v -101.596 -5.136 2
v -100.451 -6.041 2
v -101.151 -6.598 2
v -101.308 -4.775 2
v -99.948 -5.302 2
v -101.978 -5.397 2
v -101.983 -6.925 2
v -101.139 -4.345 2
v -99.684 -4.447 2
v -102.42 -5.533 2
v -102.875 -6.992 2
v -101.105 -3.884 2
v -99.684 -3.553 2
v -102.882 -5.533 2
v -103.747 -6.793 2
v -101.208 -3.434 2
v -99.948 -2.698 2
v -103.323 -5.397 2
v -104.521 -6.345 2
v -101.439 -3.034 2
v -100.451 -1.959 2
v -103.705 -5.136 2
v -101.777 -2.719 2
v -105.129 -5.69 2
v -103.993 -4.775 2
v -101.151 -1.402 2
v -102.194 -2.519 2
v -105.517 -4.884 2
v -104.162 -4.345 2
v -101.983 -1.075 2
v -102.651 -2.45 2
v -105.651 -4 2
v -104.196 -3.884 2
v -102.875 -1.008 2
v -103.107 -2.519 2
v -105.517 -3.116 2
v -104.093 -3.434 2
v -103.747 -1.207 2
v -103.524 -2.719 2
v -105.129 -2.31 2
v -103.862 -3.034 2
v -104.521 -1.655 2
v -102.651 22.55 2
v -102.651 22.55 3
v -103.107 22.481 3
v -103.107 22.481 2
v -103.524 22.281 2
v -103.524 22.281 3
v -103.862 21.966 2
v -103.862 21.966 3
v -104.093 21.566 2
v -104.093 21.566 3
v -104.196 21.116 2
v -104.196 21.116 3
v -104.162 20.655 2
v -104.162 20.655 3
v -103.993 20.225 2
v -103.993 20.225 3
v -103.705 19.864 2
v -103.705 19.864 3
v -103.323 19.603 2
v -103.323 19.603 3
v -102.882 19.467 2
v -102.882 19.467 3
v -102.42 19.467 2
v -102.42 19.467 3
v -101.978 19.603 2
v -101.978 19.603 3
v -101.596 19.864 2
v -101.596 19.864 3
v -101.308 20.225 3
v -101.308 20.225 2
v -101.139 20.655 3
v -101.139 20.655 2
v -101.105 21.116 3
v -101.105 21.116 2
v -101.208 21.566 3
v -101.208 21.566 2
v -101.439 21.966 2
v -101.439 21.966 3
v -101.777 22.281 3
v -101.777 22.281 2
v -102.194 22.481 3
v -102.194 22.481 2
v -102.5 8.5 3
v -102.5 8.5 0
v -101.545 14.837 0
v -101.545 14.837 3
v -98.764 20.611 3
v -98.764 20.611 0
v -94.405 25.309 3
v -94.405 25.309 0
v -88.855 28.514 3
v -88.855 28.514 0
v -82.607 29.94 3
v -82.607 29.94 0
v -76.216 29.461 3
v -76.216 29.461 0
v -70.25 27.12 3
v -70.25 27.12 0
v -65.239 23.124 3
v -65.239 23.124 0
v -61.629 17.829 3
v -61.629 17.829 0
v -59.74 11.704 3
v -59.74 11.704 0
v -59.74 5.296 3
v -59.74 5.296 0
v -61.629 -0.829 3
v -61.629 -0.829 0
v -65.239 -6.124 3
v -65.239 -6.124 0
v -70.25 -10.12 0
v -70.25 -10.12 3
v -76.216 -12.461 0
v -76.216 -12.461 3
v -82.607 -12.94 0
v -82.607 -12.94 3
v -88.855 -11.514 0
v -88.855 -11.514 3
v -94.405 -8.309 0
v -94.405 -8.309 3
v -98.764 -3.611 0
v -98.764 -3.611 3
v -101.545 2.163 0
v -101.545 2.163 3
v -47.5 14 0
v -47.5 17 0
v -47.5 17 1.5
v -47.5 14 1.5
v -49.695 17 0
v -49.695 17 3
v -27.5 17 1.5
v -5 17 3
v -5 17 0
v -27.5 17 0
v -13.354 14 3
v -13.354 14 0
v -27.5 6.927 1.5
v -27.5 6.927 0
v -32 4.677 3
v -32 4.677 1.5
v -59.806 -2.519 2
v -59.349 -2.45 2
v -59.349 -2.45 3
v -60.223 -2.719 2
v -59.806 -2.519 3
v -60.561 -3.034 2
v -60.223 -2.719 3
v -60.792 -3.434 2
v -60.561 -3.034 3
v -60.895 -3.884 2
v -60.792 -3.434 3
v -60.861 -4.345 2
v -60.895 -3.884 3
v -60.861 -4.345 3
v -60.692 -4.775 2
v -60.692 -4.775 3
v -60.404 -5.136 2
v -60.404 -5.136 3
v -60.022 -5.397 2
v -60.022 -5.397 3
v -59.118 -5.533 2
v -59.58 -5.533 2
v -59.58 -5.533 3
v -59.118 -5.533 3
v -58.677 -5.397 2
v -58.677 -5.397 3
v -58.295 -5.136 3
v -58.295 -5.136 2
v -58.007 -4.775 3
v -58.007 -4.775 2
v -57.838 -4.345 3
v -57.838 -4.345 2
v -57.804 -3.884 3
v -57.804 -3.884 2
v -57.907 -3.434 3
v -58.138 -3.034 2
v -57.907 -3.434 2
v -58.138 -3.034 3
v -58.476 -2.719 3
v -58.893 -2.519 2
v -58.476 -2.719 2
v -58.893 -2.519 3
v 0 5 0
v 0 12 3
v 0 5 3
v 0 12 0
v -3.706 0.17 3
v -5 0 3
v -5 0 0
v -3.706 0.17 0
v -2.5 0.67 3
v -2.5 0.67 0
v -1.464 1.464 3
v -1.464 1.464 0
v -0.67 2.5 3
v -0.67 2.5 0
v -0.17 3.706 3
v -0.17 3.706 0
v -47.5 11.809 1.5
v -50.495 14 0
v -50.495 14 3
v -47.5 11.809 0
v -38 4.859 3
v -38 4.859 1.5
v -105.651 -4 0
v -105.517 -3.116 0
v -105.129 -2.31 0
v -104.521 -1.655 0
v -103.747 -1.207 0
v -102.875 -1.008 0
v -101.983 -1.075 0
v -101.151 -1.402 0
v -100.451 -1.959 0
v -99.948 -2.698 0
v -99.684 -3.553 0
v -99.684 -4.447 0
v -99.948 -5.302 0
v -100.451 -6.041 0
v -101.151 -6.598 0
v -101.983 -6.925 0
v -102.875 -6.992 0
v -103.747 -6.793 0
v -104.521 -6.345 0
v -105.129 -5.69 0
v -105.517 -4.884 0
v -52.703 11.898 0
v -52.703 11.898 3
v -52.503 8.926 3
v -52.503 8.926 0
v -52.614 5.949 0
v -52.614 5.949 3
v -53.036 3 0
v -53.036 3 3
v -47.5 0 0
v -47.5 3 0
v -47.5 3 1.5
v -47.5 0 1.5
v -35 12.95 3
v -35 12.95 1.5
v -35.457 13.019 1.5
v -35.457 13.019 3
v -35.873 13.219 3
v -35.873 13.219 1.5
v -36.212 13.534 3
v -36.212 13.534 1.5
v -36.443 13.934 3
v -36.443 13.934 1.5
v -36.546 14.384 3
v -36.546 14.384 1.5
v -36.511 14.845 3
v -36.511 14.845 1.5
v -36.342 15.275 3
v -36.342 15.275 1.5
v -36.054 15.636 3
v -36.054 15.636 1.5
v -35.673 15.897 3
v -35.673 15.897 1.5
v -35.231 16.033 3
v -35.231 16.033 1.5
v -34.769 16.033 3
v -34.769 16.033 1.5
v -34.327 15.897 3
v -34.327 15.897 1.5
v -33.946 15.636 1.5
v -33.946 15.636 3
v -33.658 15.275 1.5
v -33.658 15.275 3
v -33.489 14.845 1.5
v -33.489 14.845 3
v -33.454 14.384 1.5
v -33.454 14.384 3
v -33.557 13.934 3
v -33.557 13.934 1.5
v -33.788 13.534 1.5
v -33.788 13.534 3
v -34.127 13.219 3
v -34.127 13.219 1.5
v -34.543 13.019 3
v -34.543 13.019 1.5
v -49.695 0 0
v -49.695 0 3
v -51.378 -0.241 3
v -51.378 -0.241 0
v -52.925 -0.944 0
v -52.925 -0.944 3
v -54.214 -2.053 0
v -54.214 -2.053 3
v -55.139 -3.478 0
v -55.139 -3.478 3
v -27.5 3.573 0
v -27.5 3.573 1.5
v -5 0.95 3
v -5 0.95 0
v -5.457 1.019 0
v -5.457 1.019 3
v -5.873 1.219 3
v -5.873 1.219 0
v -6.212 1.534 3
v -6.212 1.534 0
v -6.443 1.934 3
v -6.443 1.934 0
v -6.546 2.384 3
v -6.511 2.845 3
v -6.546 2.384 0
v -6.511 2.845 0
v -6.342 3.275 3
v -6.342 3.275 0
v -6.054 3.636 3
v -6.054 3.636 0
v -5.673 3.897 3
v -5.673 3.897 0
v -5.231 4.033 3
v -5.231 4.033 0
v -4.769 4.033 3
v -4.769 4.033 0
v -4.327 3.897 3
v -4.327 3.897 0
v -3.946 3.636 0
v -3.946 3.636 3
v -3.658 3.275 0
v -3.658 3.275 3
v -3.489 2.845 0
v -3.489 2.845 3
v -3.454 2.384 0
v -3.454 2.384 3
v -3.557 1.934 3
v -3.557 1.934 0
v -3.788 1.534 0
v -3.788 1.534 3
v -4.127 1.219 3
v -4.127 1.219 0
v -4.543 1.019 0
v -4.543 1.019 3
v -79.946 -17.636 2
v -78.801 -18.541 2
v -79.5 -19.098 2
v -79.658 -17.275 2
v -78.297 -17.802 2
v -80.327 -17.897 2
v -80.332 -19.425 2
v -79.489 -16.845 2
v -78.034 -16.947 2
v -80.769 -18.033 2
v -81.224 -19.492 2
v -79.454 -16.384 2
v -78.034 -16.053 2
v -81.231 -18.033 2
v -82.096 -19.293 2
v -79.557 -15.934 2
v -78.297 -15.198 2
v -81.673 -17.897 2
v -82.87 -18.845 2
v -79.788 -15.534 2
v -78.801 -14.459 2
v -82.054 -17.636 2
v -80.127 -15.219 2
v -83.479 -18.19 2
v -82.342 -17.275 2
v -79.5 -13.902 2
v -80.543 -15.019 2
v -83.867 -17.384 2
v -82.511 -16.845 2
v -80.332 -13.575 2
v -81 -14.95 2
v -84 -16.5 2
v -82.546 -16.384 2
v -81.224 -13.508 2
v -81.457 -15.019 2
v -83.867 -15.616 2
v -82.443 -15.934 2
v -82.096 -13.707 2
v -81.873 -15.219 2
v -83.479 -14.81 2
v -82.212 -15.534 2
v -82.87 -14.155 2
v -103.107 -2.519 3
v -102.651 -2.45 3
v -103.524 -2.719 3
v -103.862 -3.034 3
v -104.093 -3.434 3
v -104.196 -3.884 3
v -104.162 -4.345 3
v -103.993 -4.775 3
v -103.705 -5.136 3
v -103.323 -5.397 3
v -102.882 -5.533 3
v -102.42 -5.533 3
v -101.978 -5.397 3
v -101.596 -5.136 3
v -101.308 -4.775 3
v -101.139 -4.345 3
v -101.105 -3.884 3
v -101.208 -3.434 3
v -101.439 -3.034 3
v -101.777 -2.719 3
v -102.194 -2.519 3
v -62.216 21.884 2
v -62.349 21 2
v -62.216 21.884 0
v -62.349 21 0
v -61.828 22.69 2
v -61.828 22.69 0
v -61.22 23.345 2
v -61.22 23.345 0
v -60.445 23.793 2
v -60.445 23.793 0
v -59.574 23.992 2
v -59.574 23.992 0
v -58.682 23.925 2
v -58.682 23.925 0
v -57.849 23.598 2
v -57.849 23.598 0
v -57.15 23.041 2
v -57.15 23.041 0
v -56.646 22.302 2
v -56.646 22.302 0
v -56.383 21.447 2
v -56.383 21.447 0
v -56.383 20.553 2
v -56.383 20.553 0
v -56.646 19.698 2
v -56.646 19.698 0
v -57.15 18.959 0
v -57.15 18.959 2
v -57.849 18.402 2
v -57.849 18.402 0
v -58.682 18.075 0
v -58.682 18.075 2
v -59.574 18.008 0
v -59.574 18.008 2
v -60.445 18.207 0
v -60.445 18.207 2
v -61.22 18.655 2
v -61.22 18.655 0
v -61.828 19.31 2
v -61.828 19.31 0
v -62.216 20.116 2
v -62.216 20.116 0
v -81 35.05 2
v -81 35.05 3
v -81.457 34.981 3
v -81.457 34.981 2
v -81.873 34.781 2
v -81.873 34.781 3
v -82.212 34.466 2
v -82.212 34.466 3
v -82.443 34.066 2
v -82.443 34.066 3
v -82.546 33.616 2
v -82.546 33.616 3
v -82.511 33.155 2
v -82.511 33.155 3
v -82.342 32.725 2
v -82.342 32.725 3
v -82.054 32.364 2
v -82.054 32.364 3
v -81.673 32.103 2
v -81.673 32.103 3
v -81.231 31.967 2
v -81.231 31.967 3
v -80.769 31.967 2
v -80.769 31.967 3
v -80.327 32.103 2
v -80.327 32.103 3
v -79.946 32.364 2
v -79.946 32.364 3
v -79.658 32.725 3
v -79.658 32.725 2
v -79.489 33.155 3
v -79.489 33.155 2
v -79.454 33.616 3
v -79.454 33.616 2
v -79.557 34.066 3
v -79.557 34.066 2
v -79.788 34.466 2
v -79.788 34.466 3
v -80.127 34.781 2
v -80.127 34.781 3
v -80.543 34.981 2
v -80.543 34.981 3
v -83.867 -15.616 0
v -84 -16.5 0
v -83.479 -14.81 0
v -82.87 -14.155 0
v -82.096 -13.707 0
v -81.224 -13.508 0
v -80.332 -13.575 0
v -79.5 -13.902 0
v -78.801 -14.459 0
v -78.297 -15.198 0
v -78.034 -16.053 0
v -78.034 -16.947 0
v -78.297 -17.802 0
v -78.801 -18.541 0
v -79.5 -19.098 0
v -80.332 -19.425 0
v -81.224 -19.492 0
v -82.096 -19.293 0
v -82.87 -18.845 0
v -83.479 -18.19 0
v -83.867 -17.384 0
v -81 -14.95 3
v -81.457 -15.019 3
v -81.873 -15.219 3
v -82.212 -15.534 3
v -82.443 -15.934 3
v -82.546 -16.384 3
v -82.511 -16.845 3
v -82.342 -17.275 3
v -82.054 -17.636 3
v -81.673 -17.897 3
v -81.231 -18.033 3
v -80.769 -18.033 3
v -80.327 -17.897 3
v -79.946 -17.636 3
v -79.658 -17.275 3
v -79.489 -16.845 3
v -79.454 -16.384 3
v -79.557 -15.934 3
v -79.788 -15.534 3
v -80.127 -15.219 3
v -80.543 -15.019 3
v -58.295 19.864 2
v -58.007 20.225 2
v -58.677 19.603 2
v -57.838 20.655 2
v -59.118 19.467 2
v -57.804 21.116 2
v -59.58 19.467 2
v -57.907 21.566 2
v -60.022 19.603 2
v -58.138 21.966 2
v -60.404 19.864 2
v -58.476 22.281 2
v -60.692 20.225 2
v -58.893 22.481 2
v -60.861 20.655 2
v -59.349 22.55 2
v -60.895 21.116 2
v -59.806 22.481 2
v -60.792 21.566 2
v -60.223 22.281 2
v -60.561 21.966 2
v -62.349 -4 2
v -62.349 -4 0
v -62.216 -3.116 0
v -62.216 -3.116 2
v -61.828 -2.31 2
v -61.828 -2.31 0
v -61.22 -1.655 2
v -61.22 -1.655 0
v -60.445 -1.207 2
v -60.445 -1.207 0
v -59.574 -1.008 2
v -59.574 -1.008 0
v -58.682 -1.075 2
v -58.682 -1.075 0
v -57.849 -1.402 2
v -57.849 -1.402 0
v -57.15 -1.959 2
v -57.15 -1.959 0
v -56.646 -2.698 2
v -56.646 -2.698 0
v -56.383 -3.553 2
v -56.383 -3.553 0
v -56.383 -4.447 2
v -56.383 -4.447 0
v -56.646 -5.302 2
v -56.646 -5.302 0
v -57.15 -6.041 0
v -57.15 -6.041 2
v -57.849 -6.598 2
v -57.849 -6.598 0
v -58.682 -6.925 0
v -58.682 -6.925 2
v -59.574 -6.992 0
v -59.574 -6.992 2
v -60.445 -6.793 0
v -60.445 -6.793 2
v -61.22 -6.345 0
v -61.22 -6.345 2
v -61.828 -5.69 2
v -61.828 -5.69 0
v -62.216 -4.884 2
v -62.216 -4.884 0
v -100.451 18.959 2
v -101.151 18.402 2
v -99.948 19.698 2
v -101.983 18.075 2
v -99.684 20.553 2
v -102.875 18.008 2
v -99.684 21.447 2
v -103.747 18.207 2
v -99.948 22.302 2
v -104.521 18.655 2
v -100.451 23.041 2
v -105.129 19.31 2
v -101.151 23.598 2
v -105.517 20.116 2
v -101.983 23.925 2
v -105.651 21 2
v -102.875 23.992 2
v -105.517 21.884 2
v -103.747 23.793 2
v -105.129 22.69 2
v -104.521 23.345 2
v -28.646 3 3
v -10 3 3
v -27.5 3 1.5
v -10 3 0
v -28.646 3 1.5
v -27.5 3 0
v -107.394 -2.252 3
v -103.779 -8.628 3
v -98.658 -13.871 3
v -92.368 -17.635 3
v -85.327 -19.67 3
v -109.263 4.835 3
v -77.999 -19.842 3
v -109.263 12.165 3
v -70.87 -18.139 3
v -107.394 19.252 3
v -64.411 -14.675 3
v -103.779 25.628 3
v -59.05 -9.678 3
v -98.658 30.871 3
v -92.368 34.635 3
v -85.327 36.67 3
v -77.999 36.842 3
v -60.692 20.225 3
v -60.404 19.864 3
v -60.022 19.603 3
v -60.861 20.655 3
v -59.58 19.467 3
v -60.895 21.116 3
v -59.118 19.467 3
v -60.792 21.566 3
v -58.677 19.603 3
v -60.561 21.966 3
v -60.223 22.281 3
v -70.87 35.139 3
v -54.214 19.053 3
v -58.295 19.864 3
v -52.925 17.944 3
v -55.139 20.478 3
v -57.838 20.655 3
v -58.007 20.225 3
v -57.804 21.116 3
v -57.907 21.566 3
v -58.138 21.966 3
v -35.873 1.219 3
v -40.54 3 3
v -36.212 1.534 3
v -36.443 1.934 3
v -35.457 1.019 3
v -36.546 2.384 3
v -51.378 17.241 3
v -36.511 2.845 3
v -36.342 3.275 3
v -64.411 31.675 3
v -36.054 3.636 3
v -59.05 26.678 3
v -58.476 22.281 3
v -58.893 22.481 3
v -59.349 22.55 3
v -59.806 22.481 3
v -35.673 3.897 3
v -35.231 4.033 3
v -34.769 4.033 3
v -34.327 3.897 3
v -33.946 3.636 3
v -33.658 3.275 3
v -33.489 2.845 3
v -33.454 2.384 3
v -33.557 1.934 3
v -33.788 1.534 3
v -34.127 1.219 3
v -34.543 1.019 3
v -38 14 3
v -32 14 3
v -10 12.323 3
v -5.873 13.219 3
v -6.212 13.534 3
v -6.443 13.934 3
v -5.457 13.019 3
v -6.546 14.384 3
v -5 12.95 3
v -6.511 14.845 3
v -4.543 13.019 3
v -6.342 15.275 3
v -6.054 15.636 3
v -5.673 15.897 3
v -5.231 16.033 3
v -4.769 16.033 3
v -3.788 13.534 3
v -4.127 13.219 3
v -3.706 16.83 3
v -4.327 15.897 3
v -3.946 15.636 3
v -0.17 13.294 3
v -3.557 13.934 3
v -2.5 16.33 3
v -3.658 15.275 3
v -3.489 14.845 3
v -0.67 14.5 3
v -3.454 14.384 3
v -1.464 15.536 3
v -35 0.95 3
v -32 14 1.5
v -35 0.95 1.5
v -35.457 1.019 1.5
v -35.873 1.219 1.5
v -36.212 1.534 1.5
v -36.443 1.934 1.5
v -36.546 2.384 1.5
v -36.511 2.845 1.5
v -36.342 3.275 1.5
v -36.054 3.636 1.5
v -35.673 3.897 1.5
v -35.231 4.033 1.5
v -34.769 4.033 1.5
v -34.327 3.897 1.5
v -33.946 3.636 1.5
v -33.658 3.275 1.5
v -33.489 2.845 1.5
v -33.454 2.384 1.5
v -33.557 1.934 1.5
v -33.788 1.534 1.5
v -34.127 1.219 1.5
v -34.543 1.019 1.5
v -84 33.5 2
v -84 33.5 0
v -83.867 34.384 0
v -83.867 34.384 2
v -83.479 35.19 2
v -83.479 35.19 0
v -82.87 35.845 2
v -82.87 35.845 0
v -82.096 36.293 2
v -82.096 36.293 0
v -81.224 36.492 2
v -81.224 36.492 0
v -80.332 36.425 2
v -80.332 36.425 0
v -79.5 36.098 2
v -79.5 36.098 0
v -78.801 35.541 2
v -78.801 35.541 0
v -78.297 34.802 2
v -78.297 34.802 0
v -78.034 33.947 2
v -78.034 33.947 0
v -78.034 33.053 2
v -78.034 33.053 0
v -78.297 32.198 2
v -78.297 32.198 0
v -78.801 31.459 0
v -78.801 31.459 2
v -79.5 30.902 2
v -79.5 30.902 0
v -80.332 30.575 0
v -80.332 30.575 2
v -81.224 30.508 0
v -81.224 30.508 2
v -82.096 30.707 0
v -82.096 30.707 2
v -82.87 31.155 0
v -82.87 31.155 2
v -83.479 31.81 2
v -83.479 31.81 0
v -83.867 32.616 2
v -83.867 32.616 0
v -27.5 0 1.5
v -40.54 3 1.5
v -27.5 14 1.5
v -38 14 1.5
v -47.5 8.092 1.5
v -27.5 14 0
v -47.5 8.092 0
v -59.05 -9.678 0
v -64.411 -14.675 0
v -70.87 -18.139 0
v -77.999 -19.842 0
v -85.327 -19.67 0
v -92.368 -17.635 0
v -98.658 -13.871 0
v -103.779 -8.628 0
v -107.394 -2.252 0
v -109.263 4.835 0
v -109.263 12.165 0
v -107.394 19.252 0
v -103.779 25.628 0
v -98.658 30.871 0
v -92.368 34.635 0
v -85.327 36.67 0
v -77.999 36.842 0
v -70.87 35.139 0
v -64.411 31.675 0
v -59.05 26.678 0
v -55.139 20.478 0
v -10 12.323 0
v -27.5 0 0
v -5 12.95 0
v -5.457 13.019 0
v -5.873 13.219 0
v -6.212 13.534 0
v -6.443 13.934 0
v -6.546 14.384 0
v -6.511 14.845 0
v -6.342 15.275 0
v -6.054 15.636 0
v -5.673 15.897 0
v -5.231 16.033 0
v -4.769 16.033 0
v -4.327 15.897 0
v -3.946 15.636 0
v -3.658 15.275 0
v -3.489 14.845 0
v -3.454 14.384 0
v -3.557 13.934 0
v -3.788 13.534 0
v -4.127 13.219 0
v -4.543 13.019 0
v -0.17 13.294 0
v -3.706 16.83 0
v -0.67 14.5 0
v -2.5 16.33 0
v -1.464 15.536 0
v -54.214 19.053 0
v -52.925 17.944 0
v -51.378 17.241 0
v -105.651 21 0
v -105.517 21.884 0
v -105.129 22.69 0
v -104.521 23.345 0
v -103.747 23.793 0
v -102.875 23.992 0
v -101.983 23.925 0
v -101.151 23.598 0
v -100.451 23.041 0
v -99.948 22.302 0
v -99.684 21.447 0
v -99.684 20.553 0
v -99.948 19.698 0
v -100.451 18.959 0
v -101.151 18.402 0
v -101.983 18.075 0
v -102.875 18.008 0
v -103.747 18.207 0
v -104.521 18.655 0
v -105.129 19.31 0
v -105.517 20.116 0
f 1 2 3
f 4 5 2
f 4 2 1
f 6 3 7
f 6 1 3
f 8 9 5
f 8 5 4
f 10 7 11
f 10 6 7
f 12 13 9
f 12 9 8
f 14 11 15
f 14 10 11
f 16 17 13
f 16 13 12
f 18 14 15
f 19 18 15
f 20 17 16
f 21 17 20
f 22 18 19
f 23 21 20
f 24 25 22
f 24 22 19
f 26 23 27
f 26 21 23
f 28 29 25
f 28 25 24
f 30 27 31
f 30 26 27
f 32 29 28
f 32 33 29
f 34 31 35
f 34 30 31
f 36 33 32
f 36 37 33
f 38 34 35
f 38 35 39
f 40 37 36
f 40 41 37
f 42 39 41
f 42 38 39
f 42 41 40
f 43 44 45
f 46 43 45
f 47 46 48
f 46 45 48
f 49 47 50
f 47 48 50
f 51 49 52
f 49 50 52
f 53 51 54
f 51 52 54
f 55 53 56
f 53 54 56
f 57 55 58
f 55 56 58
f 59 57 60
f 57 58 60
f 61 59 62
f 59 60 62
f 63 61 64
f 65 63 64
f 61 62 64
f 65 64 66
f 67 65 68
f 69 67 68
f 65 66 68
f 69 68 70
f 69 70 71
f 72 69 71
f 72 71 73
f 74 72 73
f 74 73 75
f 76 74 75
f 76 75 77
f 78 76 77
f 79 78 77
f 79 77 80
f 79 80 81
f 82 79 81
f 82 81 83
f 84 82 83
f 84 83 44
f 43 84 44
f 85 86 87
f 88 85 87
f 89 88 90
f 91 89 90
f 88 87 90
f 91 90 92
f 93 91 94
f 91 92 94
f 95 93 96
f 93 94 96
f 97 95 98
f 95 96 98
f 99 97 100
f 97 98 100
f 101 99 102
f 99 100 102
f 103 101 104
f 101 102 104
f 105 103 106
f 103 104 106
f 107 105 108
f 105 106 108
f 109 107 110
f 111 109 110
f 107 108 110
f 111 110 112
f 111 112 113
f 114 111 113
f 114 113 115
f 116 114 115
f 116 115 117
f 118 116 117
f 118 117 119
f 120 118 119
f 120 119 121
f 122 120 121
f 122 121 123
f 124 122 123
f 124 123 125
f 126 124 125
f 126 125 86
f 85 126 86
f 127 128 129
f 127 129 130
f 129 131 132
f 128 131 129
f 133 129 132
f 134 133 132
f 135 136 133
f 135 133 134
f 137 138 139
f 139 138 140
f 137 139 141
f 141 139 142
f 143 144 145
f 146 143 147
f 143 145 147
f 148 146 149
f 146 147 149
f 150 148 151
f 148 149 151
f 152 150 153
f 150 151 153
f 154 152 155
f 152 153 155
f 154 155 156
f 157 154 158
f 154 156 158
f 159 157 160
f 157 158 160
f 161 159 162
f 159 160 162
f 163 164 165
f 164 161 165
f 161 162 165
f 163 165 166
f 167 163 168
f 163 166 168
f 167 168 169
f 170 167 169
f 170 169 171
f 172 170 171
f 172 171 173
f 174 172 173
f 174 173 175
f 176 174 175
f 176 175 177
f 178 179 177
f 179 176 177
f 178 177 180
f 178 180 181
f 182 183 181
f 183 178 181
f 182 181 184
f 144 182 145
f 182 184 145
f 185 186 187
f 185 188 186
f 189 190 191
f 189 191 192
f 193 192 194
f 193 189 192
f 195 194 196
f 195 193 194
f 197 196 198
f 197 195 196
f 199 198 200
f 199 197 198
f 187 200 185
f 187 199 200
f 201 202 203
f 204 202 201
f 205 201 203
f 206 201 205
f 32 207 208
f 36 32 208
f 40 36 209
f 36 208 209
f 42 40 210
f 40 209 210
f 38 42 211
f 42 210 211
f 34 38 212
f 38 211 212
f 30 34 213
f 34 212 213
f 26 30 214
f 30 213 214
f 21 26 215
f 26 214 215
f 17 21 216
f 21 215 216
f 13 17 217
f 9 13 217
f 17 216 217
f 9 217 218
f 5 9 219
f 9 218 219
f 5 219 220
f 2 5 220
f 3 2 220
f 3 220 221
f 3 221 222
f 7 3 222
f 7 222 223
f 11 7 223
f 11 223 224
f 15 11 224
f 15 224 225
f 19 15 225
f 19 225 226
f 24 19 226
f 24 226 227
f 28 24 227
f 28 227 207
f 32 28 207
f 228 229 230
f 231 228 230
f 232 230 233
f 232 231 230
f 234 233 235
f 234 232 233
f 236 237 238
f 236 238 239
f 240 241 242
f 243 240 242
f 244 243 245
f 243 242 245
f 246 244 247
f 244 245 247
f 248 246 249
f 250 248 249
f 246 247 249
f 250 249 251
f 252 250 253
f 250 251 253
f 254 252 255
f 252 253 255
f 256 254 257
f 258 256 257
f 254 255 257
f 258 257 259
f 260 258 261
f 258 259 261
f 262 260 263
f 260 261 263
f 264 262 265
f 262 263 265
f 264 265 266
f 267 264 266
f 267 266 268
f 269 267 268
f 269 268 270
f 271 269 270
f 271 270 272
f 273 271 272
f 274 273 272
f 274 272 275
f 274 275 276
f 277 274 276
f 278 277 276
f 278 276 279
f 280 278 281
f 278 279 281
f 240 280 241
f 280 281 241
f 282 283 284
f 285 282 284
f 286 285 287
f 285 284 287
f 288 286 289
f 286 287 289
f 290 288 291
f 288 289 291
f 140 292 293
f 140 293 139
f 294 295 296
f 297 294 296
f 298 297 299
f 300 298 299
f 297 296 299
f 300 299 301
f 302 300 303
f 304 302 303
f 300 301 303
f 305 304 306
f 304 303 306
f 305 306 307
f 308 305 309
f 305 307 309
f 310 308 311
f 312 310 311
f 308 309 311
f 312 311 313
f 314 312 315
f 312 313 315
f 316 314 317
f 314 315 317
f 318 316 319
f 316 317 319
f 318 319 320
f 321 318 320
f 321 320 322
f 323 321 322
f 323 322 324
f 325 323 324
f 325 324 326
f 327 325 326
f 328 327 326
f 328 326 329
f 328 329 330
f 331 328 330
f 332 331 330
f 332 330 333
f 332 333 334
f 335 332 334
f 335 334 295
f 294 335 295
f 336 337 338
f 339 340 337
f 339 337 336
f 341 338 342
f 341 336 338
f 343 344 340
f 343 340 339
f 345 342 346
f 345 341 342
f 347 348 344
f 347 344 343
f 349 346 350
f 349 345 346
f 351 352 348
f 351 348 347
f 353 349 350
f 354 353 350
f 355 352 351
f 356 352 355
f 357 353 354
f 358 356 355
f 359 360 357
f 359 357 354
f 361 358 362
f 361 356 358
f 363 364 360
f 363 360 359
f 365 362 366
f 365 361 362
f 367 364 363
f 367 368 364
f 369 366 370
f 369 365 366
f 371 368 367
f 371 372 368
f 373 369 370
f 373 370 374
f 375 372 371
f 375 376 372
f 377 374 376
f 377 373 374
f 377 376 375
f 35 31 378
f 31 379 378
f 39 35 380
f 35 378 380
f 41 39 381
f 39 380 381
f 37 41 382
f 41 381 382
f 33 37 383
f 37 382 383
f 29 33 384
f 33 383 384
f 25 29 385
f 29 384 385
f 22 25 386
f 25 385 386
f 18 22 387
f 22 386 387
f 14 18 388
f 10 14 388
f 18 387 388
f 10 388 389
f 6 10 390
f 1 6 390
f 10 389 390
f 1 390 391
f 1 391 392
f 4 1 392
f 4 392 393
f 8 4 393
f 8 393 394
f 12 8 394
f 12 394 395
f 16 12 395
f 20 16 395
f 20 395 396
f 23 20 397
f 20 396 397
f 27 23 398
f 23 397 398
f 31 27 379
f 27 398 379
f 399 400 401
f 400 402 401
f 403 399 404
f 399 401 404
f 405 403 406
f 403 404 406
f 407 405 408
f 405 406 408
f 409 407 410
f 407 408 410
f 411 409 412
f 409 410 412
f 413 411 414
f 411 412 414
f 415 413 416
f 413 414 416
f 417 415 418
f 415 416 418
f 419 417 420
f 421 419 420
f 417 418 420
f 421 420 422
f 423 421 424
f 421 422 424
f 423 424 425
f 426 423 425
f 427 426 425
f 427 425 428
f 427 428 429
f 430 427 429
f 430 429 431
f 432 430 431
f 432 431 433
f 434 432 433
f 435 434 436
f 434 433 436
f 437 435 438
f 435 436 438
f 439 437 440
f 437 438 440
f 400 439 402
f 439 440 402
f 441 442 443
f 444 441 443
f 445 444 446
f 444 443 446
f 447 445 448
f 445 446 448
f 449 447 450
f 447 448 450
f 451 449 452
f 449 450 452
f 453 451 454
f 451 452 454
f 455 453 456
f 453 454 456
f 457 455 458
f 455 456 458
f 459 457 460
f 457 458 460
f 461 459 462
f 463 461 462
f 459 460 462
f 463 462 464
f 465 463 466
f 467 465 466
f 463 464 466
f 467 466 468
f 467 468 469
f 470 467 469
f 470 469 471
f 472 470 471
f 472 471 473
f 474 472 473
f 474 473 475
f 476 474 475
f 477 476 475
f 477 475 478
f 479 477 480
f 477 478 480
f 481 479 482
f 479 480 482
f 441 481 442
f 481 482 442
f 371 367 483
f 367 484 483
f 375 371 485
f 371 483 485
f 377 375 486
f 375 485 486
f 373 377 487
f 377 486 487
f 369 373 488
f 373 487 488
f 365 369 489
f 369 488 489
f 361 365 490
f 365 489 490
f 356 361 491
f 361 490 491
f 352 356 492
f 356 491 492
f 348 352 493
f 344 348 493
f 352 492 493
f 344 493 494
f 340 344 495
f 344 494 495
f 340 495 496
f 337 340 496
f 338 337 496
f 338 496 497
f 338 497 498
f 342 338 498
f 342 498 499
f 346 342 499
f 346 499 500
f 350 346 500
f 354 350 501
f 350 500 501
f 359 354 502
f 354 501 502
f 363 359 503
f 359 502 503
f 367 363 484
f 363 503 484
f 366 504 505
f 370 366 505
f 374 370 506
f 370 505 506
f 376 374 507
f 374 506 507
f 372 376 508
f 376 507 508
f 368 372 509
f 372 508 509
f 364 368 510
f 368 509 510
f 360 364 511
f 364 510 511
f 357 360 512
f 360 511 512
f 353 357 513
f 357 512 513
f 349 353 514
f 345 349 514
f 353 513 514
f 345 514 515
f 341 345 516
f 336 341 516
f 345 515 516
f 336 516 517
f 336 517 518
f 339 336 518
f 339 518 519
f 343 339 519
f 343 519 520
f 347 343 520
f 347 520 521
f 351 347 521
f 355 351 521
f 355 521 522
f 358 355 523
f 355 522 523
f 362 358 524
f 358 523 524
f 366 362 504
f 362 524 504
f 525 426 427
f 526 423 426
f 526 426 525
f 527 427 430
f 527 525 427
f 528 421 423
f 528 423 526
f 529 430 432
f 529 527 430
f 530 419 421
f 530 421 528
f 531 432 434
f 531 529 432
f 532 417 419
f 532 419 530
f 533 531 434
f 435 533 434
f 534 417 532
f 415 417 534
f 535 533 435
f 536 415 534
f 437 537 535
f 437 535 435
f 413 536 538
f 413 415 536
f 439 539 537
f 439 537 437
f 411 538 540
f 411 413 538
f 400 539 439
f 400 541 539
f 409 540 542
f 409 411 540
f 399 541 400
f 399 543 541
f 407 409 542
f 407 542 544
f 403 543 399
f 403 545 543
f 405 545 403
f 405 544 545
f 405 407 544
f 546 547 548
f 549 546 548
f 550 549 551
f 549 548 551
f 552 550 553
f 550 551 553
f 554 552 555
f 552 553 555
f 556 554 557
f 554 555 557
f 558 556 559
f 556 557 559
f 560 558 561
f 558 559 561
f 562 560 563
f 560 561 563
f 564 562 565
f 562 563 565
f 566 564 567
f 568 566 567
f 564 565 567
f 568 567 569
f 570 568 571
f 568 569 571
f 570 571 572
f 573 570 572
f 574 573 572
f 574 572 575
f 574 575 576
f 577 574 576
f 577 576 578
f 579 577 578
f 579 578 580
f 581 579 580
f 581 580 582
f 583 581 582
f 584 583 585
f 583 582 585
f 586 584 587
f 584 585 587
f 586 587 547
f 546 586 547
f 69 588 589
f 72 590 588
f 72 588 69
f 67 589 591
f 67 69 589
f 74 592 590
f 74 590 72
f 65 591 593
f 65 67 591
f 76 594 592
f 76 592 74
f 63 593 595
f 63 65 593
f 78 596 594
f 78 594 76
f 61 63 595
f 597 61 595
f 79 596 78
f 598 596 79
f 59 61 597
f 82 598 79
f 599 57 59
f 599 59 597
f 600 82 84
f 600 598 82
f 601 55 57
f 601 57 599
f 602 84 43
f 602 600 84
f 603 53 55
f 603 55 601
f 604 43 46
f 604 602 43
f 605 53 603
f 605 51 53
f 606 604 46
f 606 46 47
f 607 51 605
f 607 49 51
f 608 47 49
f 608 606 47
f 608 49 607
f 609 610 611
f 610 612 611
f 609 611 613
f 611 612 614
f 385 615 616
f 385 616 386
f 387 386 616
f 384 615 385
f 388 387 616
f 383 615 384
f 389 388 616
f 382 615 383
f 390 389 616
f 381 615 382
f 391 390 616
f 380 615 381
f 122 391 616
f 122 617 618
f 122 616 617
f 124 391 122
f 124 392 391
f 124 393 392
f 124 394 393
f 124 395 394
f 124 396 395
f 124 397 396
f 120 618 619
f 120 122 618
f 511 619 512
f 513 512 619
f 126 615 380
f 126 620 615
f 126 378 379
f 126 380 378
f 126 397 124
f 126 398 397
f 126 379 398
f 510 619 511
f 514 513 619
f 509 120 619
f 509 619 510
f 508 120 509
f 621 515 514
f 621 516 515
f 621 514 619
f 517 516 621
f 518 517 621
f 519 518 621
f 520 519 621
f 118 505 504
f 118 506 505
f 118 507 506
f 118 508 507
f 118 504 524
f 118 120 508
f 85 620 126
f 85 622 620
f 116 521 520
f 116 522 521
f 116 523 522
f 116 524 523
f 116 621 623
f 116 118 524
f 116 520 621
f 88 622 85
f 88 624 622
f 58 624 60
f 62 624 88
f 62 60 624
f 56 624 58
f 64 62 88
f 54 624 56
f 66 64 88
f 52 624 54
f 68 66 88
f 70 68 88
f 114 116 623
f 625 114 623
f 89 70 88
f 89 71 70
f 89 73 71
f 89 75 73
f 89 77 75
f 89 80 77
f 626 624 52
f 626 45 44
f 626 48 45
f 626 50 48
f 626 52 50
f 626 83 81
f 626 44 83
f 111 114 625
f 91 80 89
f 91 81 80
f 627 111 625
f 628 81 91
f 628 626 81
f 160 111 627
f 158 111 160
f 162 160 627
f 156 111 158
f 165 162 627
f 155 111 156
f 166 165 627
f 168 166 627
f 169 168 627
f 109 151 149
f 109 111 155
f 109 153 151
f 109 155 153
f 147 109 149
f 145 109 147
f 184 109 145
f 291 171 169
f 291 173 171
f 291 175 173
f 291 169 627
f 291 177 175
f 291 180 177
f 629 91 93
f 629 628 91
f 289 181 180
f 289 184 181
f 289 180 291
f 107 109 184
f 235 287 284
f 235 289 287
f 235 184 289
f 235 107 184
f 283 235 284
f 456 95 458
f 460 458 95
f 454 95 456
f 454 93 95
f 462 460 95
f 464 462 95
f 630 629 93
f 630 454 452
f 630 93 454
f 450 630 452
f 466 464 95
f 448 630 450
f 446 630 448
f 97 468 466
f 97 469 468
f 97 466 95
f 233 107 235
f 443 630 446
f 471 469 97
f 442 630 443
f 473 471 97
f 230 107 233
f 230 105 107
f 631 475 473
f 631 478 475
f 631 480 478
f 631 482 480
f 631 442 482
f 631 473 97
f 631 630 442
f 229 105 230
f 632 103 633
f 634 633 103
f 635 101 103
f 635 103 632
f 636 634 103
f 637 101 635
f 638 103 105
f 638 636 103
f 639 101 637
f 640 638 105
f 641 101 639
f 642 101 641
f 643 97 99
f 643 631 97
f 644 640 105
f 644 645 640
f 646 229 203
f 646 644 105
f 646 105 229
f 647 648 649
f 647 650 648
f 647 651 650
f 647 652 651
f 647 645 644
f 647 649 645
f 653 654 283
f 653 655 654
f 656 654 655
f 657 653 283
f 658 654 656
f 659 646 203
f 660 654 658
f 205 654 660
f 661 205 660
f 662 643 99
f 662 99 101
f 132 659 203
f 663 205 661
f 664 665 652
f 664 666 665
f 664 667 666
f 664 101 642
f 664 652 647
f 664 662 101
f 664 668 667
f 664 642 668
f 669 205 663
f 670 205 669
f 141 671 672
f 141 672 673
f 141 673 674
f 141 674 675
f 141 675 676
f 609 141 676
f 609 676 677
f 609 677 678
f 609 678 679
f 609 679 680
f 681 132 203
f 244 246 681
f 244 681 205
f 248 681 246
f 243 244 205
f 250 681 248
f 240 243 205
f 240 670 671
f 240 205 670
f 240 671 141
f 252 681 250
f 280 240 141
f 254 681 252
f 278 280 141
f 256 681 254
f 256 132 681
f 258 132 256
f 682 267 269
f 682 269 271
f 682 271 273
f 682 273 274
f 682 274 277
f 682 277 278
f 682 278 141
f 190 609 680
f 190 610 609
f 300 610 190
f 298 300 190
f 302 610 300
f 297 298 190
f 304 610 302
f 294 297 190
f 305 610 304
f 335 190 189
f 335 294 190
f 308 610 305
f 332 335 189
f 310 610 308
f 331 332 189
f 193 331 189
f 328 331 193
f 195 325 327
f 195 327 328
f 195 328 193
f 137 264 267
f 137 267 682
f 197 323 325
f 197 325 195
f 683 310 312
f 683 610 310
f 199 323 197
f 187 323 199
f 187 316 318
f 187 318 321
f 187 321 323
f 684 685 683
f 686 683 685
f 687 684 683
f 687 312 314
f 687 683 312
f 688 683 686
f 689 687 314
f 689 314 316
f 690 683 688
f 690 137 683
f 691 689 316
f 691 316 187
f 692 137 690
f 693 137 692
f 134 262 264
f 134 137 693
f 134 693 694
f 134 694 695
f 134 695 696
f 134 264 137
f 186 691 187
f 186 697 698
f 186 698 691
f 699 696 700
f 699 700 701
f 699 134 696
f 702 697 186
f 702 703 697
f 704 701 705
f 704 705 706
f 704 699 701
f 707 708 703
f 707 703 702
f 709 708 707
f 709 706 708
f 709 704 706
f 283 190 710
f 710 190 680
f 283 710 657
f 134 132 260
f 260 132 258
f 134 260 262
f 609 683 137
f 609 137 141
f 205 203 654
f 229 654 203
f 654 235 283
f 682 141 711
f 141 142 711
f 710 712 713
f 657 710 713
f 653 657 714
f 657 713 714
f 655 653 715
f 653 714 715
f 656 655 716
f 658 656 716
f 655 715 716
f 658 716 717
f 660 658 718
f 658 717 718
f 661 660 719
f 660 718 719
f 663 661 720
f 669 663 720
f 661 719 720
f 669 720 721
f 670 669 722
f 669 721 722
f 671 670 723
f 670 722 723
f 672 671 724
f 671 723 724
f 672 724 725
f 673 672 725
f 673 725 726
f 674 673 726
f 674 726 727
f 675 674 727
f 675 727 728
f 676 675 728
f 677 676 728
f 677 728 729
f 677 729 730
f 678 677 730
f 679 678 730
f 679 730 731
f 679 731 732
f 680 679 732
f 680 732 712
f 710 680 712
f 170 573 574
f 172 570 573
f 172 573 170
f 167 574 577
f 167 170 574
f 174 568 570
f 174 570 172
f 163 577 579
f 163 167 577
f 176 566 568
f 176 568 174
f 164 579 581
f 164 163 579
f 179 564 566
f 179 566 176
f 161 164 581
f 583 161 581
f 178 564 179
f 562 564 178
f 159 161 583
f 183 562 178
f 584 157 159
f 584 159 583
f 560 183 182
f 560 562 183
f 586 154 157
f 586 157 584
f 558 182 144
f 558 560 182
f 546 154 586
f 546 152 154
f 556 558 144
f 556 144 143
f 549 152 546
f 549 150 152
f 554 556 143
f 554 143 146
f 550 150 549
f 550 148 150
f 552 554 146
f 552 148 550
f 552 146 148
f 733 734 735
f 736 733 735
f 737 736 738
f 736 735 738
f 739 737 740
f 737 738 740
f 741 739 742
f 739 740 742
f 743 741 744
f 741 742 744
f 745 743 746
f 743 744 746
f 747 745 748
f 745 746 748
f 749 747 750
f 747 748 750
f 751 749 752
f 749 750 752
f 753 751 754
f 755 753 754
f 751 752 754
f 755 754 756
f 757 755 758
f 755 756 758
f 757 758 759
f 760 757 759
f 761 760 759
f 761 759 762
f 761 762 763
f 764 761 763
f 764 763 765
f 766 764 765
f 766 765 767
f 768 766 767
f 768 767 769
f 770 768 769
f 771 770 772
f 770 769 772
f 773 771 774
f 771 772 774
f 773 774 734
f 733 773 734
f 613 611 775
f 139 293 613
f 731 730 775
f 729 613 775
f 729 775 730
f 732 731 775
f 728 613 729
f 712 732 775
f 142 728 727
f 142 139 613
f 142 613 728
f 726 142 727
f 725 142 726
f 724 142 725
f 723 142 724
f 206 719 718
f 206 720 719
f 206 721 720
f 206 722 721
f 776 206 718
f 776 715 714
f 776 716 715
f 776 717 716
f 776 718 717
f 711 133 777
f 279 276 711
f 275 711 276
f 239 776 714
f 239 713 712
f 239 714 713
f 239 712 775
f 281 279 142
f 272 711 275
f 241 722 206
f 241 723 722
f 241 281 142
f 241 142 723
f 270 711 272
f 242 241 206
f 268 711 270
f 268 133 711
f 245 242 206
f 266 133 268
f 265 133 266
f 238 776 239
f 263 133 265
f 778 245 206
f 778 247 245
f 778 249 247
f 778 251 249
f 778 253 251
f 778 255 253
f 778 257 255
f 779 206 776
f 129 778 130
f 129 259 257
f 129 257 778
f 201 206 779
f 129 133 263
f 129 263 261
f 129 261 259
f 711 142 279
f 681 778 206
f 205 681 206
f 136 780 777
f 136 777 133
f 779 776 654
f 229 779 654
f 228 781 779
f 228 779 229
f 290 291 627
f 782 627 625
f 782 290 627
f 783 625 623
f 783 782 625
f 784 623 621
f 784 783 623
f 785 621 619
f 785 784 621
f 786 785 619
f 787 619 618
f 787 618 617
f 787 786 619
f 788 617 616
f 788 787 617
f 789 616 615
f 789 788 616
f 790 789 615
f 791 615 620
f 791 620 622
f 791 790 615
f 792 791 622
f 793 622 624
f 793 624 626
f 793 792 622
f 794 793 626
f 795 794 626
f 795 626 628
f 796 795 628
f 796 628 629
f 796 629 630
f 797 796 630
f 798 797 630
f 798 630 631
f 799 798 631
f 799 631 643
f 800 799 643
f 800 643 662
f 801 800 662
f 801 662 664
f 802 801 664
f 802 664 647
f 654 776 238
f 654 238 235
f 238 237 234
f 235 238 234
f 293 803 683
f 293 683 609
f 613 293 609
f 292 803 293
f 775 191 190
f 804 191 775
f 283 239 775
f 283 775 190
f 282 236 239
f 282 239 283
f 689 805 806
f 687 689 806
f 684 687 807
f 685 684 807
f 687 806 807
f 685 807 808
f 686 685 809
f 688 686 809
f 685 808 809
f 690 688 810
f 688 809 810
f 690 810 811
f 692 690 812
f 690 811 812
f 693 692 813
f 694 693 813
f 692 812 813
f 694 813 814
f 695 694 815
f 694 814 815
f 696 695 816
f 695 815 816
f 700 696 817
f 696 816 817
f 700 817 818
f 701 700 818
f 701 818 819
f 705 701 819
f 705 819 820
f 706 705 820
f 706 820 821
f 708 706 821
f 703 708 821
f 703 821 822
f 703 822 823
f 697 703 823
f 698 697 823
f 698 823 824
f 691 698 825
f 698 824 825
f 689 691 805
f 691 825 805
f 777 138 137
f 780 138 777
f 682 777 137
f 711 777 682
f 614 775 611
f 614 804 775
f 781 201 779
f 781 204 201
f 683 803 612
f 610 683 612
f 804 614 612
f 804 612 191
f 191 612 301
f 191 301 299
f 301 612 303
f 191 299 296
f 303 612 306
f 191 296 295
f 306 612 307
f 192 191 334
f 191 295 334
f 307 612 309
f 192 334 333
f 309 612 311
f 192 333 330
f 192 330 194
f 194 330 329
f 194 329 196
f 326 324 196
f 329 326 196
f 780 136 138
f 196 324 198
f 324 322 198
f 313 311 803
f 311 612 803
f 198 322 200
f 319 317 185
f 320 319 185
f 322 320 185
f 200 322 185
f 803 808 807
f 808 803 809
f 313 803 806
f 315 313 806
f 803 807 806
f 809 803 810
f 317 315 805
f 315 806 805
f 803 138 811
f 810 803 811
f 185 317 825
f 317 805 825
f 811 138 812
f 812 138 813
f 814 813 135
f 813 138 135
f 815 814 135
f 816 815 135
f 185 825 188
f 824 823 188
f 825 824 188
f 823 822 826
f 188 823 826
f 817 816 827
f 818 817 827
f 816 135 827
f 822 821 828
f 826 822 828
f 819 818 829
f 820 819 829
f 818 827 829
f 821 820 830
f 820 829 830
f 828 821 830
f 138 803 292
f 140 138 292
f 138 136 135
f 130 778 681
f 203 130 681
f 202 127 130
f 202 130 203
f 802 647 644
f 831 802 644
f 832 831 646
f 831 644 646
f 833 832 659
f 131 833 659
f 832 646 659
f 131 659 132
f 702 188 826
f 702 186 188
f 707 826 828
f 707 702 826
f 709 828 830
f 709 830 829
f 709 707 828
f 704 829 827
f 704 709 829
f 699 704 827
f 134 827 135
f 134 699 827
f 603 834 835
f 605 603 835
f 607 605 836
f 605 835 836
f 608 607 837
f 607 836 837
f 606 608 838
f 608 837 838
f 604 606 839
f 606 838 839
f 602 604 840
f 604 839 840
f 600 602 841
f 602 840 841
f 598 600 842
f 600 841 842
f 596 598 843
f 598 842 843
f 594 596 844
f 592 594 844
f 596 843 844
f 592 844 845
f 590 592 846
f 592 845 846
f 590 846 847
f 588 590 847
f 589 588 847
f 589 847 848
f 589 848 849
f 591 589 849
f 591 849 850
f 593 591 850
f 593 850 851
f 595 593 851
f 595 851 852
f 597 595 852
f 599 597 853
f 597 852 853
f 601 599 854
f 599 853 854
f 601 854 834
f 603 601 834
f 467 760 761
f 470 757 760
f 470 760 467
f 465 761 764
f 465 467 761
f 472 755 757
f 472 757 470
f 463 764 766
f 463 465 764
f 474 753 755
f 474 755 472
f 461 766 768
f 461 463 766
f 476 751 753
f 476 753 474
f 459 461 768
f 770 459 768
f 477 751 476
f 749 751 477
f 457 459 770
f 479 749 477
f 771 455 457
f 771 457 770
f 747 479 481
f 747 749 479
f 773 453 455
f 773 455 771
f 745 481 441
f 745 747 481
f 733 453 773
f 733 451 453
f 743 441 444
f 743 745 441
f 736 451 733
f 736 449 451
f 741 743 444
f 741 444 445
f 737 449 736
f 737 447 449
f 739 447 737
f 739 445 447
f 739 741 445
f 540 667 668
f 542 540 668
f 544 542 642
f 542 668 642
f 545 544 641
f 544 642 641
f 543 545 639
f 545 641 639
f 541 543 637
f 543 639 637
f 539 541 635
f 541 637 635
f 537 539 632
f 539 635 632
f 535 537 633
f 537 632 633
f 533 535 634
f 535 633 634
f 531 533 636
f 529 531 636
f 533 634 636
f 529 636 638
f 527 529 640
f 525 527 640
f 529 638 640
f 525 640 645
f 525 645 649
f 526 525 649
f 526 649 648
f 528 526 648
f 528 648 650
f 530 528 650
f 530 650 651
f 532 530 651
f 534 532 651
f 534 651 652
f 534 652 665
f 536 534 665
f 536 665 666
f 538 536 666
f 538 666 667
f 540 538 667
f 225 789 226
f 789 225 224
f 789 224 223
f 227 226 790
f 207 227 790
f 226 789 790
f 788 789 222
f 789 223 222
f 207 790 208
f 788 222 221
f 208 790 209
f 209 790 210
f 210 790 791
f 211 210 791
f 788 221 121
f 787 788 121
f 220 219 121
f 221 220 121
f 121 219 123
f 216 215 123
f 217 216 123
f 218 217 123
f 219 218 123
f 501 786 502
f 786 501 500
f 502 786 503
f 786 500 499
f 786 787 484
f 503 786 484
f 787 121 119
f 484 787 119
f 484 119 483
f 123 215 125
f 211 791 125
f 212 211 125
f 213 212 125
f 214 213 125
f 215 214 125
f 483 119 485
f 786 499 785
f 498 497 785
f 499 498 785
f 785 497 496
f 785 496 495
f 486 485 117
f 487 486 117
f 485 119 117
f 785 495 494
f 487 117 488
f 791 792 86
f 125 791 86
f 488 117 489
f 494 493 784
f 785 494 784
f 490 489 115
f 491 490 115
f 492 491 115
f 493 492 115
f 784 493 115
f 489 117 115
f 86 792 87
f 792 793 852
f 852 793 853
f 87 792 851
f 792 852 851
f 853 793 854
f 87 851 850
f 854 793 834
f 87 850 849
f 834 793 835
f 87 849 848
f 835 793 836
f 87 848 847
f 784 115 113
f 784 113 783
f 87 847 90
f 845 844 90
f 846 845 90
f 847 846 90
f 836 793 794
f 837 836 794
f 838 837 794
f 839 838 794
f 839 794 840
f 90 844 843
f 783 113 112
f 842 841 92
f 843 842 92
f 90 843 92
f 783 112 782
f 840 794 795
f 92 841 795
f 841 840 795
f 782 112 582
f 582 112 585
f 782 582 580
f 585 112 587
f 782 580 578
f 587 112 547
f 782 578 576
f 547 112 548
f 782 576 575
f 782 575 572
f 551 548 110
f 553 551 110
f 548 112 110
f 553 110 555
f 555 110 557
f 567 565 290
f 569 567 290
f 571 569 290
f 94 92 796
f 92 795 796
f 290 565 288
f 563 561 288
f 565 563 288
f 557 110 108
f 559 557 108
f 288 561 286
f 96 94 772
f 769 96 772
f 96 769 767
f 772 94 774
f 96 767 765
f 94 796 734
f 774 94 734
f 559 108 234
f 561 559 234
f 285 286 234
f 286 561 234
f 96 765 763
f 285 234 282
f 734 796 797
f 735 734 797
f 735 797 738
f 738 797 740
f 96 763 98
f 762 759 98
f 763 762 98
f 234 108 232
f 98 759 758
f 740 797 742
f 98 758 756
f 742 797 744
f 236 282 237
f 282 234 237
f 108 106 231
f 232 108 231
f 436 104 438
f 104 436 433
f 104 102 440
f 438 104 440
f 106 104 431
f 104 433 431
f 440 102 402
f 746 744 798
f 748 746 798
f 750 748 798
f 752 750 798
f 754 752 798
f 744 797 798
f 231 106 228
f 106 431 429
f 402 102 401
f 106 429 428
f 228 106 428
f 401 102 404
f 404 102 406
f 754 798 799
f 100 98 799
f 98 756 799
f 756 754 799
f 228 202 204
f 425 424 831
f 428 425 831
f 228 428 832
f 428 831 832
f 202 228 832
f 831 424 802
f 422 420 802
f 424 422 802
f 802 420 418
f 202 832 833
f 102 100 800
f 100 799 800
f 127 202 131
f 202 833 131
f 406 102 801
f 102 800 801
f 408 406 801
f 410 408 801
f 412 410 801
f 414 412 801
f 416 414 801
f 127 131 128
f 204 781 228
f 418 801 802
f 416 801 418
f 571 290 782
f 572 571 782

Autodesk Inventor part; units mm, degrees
ref_plane "YZ Plane" through (0, 0, 0) normal (1, 0, 0) x (0, 1, 0)
ref_plane "XZ Plane" through (0, 0, 0) normal (0, 1, 0) x (-1, 0, 0)
ref_plane "XY Plane" through (0, 0, 0) normal (0, 0, 1) x (1, 0, 0)
sketch "スケッチ1" plane through (0, 0, 0) normal (0, 0, 1) x (1, 0, 0)
  line L0 (0, 0) -> (-109.5, 0)
  line L1 (-109.5, 0) -> (-109.5, 17)
  line L2 (-109.5, 17) -> (0, 17)
  line L3 (0, 17) -> (0, 0)
  line L4 (0, 8.5) -> (-109.5, 8.5)
  circle A0 centre (-81, 8.5) radius 28.5
  point P0 (-53.7971, 17)
  point P1 (-53.7971, 0)
  dimension "d0" = 17
  dimension "d48" = 57
  dimension "d51" = 81
extrude "押し出し1" add sketch "スケッチ1" along normal blind 3 contours L0 A0 L4 L3 | A0 L0 | L0 A0 L4 | L4 A0 L2 L3 | L4 A0 L2 | L2 A0
sketch "スケッチ2" plane through (0, 0, 3) normal (0, 0, 1) x (1, 0, 0)
  line L0 (0, 17) -> (-53.7971, 17) projected
  line L1 (-5, 17) -> (-5, 0)
  line L2 (-53.7971, 0) -> (0, 0) projected
  line L3 (-35, 17) -> (-35, 0)
  line L4 (0, 0) -> (0, 17) projected
  line L5 (0, 8.5) -> (-5, 8.5)
  line L6 (-35, 17) -> (-53.7971, 17)
  point P0 (-5, 14.5)
  point P1 (-35, 14.5)
  point P2 (-5, 2.5)
  point P3 (-35, 2.5)
  dimension "d4" = 5
  dimension "d5" = 30
  dimension "d49" = 6
  dimension "d50" = 6
hole "穴1" at (-5, 14.5, 3) at (-35, 14.5, 3) at (-5, 2.5, 3) at (-35, 2.5, 3) direction (0, 0, -1) diameter 3.1 depth 20 tip angle 118
sketch "スケッチ7" plane through (0, 0, 0) normal (0, 0, -1) x (-1, 0, 0)
  arc A0 (53.7971, 0) -> (53.7971, 17) centre (81, 8.5) ccw projected
  circle A1 centre (81, 8.5) radius 25
  line L0 (81, 8.5) -> (81, 33.5)
  line L1 (81, 8.5) -> (81, 33.5)
  point P0 (0, 0)
  point P1 (81, 33.5)
  point P2 (59.3494, 21)
  point P3 (59.3494, -4)
  point P4 (81, -16.5)
  point P5 (102.6506, -4)
  point P6 (102.6506, 21)
  dimension "d52" = 50
  dimension "d55" = 360
  dimension "d75" = 0
hole "穴3" at (-81, 33.5, 0) at (-59.3494, 21, 0) at (-59.3494, -4, 0) at (-81, -16.5, 0) at (-102.6506, -4, 0) at (-102.6506, 21, 0) direction (0, 0, 1) diameter 3.1 end through all
sketch "スケッチ8" plane through (0, 0, 0) normal (0, 0, -1) x (-1, 0, 0)
  arc A0 (53.7971, 0) -> (53.7971, 17) centre (81, 8.5) ccw projected
  circle A1 centre (81, 8.5) radius 21.5
  point P0 (0, 0)
  dimension "d64" = 43
extrude "押し出し5" cut sketch "スケッチ8" against normal blind 3
sketch "スケッチ9" plane through (0, 0, 0) normal (0, 0, -1) x (-1, 0, 0)
  circle A0 centre (59.3494, -4) radius 1.55 projected
  circle A1 centre (59.3494, -4) radius 3
  circle A2 centre (59.3494, 21) radius 1.55 projected
  circle A3 centre (59.3494, 21) radius 3
  circle A4 centre (81, 33.5) radius 1.55 projected
  circle A5 centre (81, 33.5) radius 3
  circle A6 centre (102.6506, 21) radius 1.55 projected
  circle A7 centre (102.6506, 21) radius 3
  circle A8 centre (102.6506, -4) radius 1.55 projected
  circle A9 centre (102.6506, -4) radius 3
  circle A10 centre (81, -16.5) radius 1.55 projected
  circle A11 centre (81, -16.5) radius 3
  point P0 (0, 0)
  dimension "d67" = 6
  dimension "d68" = 6
  dimension "d69" = 6
  dimension "d70" = 6
  dimension "d71" = 6
  dimension "d72" = 6
extrude "押し出し6" cut sketch "スケッチ9" against normal blind 2 contours A1 | A2 | A3 | A4 | A5 | A6 | A7 | A8 | A9 | A10 | A11
sketch "スケッチ10" plane through (0, 0, 0) normal (0, 0, -1) x (-1, 0, 0)
  line L0 (0, 17) -> (53.7971, 17) projected
  line L1 (10, 17) -> (10, 0)
  line L2 (0, 0) -> (0, 17) projected
  line L3 (53.7971, 0) -> (0, 0) projected
  line L4 (32, 17) -> (38, 17)
  line L5 (38, 17) -> (38, 0)
  line L6 (38, 0) -> (32, 0)
  line L7 (32, 0) -> (32, 17)
  line L8 (10, 3) -> (53.0357, 3)
  line L9 (10, 14) -> (38, 14)
  arc A0 (53.7971, 0) -> (53.7971, 17) centre (81, 8.5) ccw projected
  circle A1 centre (81, 8.5) radius 28.5
  line L10 (38, 14) -> (53.0357, 14)
  line L11 (53.0357, 14) -> (38, 3)
  line L12 (50.4953, 14) -> (38, 4.8586)
  line L13 (40.5404, 3) -> (52.7033, 11.8982)
  line L14 (10, 14) -> (32, 3)
  line L15 (13.3541, 14) -> (32, 4.6771)
  line L16 (10, 12.3229) -> (28.6459, 3)
  point P0 (35, 6.5)
  point P1 (32, 14)
  dimension "d76" = 10
  dimension "d77" = 3
  dimension "d78" = 3
  dimension "d79" = 3
  dimension "d80" = 3
  dimension "d81" = 1.5
  dimension "d82" = 1.5
  dimension "d83" = 1.5
  dimension "d84" = 1.5
extrude "押し出し7" cut sketch "スケッチ10" against normal blind 3 contours L7 L15 L9 | L16 L8 L1 | L10 L12 L5 | L13 A1 L8
fillet "フィレット1" radius 6 2 edges at (-53.7971, 0, 1.5) (-53.7971, 17, 1.5)
fillet "フィレット2" radius 5 2 edges at (0, 17, 1.5) (0, 0, 1.5)
sketch "スケッチ11" plane through (0, 0, 0) normal (0, 0, -1) x (-1, 0, 0)
  line L0 (5, 17) -> (49.695, 17) projected
  line L1 (27.5, 17) -> (47.5, 17)
  line L2 (47.5, 17) -> (47.5, 0)
  line L3 (47.5, 0) -> (27.5, 0)
  line L4 (27.5, 0) -> (27.5, 17)
  line L5 (0, 5) -> (0, 12) projected
  line L6 (47.5, 17) -> (47.5, 17.4159)
  arc A0 (49.695, 17) -> (55.1394, 20.4783) centre (49.695, 23) ccw projected
  line L7 (47.5, 0) -> (47.5, -0.4159)
  arc A1 (55.1394, -3.4783) -> (49.695, 0) centre (49.695, -6) ccw projected
  point P0 (0, 0)
  point P1 (47.5, 17)
  point P2 (46.695, 17)
  dimension "d89" = 27.5
  dimension "d90" = 20
extrude "押し出し8" cut sketch "スケッチ11" against normal blind 1.5
properties part number "link2plate3" material "アルミニウム 6061"
